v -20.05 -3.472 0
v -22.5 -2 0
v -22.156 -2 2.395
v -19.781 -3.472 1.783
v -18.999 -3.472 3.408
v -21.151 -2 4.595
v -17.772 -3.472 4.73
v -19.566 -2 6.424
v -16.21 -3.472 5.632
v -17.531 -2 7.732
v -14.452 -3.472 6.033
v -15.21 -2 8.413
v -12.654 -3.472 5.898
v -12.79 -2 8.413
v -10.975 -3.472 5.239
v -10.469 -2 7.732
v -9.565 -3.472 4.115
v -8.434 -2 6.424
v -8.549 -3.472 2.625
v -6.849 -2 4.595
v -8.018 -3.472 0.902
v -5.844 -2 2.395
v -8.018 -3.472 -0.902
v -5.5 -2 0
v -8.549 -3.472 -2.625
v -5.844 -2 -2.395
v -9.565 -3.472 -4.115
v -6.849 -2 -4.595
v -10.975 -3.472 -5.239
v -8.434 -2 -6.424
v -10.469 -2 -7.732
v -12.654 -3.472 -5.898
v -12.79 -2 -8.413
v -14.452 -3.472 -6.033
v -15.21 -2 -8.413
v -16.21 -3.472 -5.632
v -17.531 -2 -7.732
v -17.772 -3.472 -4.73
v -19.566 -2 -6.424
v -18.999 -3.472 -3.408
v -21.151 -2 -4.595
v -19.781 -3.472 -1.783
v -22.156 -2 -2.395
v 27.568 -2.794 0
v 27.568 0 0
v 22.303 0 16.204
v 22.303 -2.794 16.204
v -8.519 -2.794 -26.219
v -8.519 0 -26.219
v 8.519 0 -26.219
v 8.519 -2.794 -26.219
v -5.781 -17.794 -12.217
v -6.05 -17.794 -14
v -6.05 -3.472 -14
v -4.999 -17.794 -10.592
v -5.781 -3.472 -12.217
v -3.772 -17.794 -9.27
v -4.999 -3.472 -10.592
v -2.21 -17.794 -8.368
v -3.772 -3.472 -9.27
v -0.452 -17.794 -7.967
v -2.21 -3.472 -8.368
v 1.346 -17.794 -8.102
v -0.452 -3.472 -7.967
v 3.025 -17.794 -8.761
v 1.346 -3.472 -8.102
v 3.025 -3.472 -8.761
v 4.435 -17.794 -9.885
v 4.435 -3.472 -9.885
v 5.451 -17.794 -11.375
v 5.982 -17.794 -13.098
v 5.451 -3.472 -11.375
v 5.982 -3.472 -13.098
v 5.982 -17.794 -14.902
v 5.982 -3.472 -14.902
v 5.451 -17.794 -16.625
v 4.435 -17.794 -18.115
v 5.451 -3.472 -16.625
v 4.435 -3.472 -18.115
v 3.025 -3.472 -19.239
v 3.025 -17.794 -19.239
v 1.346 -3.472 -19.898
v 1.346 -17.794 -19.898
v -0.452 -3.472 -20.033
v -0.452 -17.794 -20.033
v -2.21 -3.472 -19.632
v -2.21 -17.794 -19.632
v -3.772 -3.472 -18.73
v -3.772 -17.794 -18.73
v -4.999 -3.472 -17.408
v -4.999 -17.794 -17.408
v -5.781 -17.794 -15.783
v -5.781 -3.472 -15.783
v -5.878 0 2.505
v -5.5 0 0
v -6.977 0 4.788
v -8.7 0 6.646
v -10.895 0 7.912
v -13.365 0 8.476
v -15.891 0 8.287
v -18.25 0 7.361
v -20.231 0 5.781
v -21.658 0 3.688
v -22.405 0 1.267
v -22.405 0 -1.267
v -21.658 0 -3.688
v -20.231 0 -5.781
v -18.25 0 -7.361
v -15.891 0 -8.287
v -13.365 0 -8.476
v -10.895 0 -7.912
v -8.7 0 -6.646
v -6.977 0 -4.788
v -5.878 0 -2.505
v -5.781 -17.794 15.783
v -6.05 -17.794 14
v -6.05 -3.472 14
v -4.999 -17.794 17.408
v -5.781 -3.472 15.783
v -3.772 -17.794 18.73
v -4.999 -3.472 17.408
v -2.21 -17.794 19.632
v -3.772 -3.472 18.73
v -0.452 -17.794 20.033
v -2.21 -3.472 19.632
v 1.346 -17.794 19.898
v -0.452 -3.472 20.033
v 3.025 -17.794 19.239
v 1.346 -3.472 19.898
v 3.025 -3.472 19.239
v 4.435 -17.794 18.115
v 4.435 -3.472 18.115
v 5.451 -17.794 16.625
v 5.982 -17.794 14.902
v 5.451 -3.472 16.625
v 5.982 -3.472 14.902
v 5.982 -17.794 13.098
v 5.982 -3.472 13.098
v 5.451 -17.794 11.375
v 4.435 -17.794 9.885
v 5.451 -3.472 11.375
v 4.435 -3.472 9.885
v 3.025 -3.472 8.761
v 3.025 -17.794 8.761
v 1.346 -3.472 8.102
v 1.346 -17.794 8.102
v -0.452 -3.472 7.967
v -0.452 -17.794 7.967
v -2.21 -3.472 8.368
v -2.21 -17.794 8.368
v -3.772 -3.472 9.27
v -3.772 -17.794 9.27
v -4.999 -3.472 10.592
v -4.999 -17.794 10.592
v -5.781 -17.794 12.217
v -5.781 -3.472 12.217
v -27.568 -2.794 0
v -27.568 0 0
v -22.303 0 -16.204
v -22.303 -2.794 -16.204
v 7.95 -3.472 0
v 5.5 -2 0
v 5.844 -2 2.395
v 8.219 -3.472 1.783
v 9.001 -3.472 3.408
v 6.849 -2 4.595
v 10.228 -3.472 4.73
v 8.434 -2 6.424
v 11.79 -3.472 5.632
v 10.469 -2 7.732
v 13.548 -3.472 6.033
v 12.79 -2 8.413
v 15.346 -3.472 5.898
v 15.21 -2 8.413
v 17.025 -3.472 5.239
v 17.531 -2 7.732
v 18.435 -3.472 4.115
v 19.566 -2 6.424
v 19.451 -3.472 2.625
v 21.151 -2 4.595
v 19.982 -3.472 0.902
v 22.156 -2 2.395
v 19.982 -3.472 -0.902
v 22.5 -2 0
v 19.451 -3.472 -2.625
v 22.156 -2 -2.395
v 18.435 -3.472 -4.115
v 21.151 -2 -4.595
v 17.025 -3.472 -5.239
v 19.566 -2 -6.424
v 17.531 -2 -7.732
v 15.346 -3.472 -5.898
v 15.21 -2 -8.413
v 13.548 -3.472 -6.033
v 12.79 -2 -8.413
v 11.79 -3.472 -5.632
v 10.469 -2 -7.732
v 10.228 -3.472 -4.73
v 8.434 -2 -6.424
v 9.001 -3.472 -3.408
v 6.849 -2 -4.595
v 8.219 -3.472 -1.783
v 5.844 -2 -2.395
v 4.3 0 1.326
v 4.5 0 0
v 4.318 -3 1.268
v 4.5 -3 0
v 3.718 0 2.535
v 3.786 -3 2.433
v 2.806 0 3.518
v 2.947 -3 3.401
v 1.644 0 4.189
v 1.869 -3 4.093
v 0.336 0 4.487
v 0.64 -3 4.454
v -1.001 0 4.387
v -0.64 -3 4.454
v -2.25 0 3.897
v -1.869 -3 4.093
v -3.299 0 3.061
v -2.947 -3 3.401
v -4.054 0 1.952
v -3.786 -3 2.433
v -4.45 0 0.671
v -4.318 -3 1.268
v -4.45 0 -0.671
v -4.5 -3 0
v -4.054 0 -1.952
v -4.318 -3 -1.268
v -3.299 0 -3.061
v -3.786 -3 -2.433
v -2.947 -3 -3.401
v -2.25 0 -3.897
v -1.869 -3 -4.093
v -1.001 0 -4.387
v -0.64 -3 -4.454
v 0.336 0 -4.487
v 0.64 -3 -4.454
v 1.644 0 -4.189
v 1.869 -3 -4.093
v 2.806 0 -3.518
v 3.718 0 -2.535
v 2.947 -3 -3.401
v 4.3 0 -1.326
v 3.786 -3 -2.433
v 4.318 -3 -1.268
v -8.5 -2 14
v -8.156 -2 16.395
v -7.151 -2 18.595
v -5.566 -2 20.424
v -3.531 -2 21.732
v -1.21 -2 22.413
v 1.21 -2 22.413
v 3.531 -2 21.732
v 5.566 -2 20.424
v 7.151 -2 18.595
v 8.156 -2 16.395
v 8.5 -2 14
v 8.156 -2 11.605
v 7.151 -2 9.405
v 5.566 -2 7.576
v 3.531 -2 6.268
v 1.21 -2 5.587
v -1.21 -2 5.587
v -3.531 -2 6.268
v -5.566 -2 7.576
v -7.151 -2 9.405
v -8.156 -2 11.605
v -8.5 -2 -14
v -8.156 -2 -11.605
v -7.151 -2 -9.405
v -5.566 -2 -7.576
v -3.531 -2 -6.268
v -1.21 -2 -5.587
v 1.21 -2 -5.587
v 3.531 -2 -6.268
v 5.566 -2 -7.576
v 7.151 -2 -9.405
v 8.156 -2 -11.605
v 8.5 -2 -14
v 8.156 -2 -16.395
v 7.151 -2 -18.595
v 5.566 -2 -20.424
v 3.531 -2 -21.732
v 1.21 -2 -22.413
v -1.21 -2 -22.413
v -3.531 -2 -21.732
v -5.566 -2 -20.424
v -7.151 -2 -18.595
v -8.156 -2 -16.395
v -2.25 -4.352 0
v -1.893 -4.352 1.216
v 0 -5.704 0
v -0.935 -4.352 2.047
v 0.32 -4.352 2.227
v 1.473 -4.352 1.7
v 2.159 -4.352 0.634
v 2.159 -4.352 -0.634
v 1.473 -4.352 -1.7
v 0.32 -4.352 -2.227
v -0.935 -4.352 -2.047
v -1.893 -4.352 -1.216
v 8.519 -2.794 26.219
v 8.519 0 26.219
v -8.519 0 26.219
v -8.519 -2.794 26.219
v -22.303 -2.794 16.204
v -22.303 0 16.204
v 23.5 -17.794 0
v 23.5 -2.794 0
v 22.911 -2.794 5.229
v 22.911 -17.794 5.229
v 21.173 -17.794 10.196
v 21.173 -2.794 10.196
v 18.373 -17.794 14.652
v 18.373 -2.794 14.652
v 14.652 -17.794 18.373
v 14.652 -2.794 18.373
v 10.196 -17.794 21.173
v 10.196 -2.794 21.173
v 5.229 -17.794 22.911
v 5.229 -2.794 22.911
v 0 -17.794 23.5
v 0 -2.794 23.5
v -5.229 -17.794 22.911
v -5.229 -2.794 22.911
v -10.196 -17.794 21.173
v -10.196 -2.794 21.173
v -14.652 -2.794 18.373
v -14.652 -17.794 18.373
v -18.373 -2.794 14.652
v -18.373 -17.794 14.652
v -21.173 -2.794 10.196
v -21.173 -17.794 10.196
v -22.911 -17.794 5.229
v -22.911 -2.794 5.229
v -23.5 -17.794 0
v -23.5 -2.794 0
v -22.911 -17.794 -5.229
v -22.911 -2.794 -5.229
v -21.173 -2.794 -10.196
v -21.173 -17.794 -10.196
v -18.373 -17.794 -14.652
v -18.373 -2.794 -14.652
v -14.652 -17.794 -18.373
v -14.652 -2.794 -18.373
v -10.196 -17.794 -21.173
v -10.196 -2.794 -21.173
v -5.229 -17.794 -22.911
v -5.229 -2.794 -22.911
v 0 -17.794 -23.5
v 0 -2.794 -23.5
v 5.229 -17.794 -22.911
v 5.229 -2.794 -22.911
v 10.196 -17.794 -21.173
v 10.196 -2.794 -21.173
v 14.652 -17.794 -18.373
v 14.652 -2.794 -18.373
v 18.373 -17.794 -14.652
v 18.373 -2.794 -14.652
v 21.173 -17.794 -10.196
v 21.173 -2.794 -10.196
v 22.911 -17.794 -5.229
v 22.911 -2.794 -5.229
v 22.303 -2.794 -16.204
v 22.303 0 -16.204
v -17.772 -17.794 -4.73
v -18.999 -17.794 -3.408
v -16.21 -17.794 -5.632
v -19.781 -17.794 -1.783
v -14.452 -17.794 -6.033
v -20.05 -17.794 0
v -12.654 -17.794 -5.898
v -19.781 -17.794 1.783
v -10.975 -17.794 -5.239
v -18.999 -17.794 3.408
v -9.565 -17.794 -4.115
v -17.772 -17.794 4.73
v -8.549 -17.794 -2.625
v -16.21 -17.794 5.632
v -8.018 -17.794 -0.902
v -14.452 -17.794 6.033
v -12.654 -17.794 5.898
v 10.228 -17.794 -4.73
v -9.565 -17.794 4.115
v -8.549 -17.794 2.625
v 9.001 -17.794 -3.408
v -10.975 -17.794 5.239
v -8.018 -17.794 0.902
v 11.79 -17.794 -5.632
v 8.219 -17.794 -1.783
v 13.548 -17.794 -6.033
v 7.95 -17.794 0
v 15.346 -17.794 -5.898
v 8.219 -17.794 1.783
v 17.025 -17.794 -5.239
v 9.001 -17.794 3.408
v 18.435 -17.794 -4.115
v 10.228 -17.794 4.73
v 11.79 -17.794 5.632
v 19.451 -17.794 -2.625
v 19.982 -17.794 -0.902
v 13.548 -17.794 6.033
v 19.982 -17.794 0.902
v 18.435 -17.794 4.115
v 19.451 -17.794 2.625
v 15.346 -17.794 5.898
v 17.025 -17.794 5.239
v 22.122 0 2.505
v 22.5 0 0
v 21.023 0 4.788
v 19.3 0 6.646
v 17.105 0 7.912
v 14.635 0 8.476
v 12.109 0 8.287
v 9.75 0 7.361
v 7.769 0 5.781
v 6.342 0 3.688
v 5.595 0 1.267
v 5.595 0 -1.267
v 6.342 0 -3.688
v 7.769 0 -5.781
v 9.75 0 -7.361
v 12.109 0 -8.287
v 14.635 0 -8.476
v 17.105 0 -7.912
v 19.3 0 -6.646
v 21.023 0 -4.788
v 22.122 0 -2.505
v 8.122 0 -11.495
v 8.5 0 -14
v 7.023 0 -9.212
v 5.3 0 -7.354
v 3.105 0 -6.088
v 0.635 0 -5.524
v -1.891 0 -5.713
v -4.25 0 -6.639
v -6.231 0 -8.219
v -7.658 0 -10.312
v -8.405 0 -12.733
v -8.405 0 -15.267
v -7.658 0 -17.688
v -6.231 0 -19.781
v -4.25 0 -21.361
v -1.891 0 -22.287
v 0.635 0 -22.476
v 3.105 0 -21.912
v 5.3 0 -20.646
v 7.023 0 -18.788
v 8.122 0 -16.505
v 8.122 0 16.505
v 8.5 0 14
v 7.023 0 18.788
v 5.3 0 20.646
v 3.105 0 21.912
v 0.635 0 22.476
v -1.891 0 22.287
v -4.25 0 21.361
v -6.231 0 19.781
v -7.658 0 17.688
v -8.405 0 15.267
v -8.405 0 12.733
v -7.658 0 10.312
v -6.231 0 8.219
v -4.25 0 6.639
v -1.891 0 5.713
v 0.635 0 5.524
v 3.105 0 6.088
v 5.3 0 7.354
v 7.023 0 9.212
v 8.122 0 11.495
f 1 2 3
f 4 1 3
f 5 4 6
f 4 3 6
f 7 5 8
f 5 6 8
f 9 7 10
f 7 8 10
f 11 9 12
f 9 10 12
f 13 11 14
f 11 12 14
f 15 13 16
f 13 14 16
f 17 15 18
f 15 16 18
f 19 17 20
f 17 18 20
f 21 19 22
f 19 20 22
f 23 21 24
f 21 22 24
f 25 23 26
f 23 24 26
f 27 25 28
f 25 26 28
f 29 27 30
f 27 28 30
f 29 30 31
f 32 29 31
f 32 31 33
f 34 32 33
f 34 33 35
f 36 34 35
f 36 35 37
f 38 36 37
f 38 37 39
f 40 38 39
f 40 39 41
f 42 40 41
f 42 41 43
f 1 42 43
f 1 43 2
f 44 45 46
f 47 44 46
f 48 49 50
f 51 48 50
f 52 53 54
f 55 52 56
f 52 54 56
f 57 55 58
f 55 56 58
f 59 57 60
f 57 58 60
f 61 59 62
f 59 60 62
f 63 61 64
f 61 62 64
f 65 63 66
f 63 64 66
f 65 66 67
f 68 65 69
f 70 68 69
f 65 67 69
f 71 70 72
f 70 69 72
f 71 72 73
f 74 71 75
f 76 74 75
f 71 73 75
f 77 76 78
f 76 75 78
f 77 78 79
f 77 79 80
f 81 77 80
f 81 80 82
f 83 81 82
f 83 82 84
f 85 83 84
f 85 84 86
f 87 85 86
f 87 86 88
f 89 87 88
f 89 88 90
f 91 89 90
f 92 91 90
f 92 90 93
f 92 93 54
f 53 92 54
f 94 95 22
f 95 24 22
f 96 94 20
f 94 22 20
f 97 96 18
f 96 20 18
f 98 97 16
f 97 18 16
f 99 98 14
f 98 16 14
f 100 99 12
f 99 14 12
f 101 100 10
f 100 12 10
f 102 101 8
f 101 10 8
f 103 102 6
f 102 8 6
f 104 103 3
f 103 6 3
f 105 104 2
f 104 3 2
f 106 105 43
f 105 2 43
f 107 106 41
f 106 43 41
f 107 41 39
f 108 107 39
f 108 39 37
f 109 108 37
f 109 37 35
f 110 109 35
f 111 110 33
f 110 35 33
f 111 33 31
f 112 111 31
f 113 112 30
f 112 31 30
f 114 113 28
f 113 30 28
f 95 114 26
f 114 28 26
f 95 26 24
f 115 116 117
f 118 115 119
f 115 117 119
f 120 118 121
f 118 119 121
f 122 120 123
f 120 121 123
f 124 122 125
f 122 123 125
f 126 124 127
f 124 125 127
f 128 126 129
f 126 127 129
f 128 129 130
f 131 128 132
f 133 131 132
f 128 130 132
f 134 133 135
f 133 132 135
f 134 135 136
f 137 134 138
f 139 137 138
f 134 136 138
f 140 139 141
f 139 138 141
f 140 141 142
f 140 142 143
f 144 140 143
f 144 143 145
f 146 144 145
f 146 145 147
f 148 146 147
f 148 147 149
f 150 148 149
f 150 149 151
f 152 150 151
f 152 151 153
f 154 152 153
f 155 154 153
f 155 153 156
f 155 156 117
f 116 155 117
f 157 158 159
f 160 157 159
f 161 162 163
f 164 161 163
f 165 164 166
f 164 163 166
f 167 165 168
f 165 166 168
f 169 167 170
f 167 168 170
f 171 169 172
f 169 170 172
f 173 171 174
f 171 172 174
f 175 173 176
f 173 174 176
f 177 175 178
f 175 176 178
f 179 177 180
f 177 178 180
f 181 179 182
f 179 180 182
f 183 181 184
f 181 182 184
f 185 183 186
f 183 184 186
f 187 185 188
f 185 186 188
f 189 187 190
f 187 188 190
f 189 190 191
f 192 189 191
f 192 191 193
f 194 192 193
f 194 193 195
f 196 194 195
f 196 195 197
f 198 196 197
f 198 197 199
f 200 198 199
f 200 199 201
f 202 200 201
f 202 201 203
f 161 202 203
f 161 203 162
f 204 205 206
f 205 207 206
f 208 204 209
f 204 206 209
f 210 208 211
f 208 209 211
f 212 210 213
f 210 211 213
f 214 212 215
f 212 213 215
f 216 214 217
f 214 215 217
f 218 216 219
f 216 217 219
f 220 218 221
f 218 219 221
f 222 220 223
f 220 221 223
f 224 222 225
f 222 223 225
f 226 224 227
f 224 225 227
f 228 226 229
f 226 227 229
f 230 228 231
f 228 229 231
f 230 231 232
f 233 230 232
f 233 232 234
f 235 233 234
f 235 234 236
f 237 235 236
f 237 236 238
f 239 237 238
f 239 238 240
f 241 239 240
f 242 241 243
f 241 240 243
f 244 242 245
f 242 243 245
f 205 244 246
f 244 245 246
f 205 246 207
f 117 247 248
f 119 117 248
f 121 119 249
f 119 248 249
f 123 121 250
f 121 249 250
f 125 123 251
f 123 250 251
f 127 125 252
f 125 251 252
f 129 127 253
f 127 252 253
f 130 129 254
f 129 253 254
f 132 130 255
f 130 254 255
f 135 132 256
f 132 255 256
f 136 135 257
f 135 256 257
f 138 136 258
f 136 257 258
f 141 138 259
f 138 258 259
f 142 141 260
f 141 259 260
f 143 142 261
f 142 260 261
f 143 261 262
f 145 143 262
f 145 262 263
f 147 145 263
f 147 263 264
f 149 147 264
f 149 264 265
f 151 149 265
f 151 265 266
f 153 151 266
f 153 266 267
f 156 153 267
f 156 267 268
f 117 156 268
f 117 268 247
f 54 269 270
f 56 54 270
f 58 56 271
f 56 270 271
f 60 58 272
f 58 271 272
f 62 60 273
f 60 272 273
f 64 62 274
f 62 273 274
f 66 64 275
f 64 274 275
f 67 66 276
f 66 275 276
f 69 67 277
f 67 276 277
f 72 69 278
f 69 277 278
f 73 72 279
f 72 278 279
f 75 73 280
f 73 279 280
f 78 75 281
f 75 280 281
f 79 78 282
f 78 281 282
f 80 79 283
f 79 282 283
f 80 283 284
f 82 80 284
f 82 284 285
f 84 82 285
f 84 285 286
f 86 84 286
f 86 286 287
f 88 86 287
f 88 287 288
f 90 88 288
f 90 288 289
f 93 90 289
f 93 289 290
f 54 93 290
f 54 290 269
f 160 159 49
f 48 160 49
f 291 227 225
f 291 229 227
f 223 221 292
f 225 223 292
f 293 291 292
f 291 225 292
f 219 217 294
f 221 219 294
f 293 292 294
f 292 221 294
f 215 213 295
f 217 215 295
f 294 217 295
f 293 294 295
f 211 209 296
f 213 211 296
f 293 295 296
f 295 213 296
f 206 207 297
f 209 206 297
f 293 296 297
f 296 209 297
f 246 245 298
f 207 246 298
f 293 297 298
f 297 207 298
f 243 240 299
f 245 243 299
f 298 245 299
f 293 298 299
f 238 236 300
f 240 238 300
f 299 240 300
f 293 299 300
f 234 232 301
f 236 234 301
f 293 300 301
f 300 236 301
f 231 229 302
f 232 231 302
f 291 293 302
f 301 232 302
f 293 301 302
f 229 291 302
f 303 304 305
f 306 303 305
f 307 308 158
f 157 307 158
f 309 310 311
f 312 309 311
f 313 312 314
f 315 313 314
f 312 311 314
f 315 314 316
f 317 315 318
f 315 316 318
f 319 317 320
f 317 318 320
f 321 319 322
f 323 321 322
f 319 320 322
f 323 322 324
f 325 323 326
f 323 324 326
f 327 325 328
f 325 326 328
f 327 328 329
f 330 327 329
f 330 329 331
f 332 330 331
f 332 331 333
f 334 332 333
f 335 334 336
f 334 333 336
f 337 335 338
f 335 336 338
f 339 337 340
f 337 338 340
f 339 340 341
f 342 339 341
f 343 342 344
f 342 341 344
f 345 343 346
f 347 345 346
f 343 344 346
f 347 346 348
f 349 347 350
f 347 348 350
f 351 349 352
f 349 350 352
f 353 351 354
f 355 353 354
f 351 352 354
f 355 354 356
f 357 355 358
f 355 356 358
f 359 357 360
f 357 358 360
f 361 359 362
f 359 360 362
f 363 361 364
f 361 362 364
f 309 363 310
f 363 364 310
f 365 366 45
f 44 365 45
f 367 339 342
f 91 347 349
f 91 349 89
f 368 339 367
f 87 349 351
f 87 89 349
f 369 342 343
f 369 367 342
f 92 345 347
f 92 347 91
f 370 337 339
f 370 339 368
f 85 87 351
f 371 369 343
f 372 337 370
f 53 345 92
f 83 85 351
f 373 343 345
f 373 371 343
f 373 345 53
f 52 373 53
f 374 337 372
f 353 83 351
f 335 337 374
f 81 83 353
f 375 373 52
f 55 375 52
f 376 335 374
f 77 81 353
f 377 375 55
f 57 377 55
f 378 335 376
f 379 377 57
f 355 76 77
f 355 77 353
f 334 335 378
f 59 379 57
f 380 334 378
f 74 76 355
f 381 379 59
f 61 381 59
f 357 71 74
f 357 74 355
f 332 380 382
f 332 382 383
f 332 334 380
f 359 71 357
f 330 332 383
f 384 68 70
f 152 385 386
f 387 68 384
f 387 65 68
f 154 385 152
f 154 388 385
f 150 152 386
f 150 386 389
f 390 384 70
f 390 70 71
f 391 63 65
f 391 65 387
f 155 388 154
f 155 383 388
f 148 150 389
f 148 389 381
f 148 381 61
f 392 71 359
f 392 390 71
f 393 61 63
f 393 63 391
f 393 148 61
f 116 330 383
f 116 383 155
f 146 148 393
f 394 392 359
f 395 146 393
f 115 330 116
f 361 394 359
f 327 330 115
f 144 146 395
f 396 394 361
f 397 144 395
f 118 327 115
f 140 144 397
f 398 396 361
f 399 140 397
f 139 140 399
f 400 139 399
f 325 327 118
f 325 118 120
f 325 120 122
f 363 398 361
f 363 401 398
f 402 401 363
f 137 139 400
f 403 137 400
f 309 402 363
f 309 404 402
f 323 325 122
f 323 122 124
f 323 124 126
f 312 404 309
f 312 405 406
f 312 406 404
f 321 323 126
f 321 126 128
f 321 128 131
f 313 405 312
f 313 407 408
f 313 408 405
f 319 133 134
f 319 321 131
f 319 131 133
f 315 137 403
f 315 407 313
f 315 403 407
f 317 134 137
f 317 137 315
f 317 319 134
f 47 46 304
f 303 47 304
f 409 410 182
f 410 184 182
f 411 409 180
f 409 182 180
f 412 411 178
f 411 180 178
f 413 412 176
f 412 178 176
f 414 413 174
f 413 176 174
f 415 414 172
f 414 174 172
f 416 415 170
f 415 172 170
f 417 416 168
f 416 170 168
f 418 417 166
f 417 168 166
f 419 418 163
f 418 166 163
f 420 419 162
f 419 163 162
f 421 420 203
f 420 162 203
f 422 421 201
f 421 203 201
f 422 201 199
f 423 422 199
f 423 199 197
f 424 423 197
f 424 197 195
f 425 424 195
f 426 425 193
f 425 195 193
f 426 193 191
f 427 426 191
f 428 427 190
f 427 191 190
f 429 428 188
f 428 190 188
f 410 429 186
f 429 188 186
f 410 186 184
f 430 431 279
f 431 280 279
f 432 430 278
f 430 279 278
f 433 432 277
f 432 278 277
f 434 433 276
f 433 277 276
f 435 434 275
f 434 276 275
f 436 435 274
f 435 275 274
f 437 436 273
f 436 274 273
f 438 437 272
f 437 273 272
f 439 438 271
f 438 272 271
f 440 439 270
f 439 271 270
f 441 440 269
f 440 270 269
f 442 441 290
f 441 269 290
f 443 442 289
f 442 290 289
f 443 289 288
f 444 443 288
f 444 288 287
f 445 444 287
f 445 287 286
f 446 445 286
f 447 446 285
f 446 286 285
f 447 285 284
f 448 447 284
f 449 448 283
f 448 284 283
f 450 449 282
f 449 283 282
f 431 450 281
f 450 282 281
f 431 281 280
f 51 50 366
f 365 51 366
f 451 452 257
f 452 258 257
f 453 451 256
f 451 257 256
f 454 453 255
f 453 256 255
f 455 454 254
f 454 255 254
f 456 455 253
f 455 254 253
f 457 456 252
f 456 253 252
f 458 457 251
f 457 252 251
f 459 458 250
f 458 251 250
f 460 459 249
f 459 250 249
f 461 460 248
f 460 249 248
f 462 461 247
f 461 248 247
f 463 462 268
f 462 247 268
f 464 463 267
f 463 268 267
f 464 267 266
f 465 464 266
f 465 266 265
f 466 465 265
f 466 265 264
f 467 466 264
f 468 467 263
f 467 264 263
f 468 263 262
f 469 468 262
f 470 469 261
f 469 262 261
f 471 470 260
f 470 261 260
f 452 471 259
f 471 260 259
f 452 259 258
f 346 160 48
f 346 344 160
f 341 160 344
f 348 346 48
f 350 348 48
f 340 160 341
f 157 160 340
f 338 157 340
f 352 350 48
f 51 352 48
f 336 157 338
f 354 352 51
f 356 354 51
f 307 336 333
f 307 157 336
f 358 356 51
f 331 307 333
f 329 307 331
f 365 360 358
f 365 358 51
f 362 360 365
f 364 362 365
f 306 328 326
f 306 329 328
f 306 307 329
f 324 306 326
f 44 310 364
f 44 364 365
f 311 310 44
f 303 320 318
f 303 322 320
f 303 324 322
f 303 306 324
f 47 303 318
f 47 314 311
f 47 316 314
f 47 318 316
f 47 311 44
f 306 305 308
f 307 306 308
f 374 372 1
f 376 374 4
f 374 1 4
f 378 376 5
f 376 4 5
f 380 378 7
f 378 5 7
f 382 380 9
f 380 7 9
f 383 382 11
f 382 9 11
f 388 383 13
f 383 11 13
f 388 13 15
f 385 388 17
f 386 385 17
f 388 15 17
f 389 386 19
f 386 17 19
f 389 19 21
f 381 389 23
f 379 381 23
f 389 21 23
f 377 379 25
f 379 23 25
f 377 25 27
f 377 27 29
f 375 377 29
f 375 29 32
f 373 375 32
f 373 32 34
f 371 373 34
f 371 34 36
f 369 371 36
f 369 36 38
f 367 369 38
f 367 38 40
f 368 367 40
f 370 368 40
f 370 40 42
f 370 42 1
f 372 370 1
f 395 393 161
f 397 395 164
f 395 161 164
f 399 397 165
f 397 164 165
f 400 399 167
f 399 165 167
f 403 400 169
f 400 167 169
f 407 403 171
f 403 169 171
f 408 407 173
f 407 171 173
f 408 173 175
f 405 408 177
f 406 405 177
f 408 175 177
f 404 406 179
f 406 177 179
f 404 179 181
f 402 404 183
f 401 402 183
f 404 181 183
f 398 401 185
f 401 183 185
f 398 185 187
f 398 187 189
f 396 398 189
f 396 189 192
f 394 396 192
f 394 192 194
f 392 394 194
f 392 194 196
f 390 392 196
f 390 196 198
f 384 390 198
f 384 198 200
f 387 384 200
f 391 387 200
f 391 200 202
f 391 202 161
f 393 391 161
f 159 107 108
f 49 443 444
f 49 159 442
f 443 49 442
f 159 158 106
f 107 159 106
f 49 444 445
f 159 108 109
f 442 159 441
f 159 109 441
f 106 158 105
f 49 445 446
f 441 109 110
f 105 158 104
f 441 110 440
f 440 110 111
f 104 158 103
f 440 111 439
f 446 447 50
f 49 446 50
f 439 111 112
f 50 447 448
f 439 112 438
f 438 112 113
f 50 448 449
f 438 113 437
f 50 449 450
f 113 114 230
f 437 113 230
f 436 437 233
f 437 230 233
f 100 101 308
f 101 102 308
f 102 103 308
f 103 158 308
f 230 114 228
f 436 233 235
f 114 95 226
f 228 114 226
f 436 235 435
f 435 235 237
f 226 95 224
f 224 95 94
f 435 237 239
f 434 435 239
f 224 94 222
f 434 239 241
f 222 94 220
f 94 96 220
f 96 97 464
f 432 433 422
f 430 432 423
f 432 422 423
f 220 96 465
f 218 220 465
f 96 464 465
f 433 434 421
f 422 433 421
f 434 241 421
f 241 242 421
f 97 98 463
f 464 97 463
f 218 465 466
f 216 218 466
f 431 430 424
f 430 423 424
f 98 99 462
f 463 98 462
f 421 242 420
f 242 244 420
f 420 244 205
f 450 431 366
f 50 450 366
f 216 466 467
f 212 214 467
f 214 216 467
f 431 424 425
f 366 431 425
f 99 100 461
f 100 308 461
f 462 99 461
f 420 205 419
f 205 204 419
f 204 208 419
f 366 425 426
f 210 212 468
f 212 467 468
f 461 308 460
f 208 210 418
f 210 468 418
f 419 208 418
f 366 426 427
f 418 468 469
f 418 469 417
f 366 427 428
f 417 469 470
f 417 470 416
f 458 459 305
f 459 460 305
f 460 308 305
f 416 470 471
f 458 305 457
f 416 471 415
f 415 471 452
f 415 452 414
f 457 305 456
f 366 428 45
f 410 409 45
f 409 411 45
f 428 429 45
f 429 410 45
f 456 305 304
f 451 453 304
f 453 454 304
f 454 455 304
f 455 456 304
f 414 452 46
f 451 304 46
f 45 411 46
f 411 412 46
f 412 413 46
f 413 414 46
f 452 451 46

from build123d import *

# Parameters (mm, degrees)
F1_DEPTH = 2.794
F2_R     = 23.5
F3_DEPTH = 15
F5_D     = 12.1
F7_D     = 9
F7_DEPTH = 3
F7_TIP   = 2.7038727856
F9_D     = 17
F9_DEPTH = 2
F9_TIP   = 5.1073152617


with BuildPart() as f1:
    # F0 (on Front) → F1 (new body)
    with BuildSketch(Plane.XZ):
        Polygon((-22.3028203132, 16.203947452), (-27.5678019971, 0), (-22.3028203132, -16.203947452), (-8.5189193147, -26.2185377292), (8.5189193147, -26.2185377292), (22.3028203132, -16.203947452), (27.5678019971, 0), (22.3028203132, 16.203947452), (8.5189193147, 26.2185377292), (-8.5189193147, 26.2185377292), align=None)
    extrude(amount=F1_DEPTH)

    # F2 (on face) → F3 (join)
    with BuildSketch(Plane.XZ.offset(2.794)):
        Circle(F2_R)
    extrude(amount=F3_DEPTH)

    # F5 (through all)
    with Locations(Plane.XZ.offset(17.794)):
        with Locations((-14, 0), (0, 14), (14, 0), (0, -14)):
            Hole(F5_D / 2)

    # F7
    with Locations(Plane(origin=(0, 0, 0), x_dir=(-1, 0, 0), z_dir=(0, 1, 0))):
        with Locations((0, 0)):
            Hole(F7_D / 2, depth=F7_DEPTH)
            with Locations((0, 0, -(F7_DEPTH + F7_TIP / 2))):  # 118° drill point
                Cone(0, F7_D / 2, F7_TIP, mode=Mode.SUBTRACT)

    # F9
    with Locations(Plane(origin=(0, 0, 0), x_dir=(-1, 0, 0), z_dir=(0, 1, 0))):
        with Locations((-14, 0), (0, 14), (14, 0), (0, -14)):
            Hole(F9_D / 2, depth=F9_DEPTH)
            with Locations((0, 0, -(F9_DEPTH + F9_TIP / 2))):  # 118° drill point
                Cone(0, F9_D / 2, F9_TIP, mode=Mode.SUBTRACT)


solid = f1.part
